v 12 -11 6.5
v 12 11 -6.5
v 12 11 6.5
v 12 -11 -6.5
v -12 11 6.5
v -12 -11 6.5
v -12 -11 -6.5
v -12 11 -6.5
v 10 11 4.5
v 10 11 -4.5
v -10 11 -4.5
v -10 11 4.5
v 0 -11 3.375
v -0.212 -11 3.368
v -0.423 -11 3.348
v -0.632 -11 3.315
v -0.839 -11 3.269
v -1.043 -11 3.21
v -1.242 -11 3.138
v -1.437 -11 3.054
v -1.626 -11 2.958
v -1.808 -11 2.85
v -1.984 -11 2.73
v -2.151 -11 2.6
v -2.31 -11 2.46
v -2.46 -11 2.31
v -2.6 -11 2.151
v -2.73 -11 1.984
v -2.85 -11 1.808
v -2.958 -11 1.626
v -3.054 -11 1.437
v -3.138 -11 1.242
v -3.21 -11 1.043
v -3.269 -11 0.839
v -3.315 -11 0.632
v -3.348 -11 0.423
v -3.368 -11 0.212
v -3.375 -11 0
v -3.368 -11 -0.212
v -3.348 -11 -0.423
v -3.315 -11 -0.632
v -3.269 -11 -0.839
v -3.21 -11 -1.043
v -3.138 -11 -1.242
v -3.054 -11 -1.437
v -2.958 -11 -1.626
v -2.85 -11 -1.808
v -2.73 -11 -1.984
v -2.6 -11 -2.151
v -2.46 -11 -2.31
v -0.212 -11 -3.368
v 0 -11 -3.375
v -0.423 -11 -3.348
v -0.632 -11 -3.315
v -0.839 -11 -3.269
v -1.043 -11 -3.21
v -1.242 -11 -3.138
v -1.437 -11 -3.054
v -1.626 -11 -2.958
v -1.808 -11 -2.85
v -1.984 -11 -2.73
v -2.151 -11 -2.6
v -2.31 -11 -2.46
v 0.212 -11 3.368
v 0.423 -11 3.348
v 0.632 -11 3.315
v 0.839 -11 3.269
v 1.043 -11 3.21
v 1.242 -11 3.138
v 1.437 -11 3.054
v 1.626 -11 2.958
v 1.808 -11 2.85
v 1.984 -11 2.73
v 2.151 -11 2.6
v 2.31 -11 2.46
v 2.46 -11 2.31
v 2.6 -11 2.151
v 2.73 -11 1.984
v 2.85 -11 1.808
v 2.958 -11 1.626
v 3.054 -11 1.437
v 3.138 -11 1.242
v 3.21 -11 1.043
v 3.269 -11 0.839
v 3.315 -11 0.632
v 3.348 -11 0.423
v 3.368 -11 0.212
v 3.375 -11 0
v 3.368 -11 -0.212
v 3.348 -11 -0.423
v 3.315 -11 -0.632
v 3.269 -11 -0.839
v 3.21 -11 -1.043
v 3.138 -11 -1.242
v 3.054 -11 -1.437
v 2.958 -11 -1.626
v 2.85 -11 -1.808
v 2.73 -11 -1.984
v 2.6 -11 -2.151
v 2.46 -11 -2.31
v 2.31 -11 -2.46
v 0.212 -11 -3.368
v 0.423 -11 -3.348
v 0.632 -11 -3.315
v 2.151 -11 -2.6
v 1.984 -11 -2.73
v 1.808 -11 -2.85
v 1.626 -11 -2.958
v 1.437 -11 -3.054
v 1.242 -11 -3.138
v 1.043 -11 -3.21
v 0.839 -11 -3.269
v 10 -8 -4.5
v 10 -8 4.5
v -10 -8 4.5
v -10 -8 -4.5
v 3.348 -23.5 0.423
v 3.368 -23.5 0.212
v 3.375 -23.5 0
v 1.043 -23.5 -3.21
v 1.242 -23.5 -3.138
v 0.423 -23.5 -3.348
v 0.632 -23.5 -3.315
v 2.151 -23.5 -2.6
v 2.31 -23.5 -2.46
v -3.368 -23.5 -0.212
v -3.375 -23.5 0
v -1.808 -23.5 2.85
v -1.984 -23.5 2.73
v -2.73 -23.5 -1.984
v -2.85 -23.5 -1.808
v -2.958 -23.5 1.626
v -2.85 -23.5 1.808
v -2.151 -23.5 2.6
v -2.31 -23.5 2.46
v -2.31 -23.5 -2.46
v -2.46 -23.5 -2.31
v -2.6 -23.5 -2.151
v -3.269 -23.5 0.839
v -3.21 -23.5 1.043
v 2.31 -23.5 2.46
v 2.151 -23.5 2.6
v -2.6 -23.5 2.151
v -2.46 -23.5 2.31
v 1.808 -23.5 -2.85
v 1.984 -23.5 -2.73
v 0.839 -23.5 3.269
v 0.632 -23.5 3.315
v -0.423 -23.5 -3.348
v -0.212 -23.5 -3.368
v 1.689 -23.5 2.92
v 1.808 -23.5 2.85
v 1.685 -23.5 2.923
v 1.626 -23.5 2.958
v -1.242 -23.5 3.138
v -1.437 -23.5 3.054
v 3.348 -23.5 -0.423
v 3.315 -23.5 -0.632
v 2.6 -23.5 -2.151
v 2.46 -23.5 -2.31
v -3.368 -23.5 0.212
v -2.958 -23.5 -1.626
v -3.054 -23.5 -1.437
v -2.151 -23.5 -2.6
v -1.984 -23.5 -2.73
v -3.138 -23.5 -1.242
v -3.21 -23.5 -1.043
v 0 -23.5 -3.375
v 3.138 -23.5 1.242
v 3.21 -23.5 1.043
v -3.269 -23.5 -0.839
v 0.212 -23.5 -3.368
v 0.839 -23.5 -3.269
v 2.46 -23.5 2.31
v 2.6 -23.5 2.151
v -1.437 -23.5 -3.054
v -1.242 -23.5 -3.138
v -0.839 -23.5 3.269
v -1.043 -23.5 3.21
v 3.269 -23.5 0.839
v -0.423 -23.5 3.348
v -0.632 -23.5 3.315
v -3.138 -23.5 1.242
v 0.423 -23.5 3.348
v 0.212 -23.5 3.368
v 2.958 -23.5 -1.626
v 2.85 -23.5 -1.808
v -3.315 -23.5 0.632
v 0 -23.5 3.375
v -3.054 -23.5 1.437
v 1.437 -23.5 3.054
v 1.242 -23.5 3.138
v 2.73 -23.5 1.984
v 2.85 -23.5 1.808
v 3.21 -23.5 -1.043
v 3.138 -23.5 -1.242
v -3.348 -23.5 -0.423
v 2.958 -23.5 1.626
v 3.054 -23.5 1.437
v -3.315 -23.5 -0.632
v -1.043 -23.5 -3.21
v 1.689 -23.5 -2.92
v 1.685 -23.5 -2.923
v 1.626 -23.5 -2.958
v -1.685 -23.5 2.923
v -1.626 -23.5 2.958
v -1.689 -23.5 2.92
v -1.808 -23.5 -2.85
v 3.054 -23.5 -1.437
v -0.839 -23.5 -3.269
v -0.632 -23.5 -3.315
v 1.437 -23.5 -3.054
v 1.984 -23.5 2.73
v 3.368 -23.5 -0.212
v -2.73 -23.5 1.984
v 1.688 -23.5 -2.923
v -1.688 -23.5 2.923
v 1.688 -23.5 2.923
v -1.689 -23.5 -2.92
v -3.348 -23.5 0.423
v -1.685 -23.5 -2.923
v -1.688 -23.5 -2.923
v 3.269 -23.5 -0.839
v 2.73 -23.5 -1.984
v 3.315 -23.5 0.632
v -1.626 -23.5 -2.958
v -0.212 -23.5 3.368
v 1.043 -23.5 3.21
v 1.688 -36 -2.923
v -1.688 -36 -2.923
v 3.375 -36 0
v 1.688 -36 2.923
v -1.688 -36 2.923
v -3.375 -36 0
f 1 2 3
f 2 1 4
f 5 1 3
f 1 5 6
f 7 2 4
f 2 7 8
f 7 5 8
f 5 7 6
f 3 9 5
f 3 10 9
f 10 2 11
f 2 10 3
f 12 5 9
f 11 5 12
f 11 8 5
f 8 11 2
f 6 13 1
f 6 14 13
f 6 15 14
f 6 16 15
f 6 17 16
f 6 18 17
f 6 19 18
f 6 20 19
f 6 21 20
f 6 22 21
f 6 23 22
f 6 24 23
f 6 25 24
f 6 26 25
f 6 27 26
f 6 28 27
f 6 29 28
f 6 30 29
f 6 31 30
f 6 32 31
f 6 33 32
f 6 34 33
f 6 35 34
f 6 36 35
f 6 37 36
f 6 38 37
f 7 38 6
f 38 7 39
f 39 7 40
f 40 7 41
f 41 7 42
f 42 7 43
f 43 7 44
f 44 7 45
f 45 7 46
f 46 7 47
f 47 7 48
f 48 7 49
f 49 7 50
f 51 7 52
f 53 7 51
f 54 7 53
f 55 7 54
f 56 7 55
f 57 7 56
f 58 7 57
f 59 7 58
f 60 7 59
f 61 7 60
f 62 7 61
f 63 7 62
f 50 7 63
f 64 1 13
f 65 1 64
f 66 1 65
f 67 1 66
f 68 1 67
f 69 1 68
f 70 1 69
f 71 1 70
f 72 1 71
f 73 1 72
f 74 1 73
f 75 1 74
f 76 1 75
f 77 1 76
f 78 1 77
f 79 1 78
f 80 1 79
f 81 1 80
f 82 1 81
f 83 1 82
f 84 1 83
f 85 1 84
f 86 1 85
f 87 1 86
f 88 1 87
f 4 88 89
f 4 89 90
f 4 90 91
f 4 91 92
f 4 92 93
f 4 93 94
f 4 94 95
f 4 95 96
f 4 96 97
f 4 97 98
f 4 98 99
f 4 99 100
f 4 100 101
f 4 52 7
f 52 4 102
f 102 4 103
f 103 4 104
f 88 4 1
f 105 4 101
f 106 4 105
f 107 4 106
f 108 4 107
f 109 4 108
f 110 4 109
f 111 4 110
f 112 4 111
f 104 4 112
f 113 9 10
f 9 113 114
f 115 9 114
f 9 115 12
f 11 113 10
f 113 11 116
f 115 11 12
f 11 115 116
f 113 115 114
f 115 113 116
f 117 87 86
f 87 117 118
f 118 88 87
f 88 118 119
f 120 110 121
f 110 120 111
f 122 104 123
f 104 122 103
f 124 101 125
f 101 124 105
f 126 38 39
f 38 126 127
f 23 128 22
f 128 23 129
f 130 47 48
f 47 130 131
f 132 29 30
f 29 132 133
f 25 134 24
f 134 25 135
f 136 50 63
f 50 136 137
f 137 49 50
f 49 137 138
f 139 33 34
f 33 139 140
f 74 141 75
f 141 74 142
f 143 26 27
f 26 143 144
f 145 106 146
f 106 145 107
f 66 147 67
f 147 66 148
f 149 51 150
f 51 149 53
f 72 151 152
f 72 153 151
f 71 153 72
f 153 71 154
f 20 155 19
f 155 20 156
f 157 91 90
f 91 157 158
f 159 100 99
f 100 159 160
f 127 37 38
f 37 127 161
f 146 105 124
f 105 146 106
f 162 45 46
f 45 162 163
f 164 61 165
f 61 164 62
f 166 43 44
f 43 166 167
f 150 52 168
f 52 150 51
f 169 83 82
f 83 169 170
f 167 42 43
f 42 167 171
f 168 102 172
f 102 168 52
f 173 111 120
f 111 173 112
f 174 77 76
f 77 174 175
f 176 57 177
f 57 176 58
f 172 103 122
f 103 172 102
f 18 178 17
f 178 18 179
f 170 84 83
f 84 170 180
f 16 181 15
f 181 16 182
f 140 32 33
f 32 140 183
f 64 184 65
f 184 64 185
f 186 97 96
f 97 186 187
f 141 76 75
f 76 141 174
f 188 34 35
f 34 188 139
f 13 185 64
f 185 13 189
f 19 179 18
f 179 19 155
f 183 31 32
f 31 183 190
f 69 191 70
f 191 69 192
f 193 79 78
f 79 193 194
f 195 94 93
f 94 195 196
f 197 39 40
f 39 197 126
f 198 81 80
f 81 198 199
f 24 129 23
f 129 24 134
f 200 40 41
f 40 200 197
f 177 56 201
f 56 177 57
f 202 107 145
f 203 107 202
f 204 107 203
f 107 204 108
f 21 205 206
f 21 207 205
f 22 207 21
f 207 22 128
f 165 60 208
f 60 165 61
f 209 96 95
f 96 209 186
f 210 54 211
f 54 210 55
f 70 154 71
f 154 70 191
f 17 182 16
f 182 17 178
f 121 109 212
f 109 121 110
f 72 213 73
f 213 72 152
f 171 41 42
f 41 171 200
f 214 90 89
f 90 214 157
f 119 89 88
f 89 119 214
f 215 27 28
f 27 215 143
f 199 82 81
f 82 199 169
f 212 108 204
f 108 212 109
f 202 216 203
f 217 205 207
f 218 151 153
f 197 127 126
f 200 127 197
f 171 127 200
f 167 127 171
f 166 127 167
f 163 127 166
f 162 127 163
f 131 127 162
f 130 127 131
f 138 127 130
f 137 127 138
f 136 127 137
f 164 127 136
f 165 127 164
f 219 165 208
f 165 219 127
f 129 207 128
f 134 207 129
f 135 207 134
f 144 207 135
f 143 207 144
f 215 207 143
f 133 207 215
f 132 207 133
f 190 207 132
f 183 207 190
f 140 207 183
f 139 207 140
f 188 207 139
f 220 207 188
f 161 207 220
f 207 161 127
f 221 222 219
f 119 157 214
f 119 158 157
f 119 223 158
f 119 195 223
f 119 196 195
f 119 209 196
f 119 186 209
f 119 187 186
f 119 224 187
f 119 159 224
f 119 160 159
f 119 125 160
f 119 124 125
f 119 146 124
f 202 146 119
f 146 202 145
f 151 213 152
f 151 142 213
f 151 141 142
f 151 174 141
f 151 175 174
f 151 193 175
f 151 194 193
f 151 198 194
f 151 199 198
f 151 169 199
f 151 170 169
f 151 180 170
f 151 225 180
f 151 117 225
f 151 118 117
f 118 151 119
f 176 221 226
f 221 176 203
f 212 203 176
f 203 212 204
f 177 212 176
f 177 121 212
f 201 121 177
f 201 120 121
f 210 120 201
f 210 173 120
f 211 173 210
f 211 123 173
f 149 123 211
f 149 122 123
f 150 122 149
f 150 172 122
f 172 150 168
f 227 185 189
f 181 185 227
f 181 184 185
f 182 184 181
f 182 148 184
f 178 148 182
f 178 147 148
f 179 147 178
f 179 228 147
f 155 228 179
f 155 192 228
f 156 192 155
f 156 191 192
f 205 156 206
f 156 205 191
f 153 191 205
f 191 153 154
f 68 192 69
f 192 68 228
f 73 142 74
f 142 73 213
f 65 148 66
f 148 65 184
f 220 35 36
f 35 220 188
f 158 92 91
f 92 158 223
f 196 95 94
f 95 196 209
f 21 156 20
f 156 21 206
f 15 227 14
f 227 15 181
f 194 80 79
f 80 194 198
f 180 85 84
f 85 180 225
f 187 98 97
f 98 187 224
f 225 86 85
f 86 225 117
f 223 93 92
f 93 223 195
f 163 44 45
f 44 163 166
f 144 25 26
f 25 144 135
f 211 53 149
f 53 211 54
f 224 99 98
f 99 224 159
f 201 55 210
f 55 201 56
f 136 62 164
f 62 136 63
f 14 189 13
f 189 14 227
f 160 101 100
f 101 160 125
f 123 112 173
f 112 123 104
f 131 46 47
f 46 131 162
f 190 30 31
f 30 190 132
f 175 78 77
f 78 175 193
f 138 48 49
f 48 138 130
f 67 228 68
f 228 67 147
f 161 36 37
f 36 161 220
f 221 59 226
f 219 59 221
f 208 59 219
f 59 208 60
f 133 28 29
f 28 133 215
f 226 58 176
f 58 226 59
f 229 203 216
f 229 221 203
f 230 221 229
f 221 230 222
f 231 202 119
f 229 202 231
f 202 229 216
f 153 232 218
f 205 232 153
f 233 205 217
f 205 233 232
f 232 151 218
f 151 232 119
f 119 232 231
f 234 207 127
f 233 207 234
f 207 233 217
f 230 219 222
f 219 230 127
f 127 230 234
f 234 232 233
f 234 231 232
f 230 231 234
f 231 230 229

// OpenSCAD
//Guitar Tuner Drill Atachment 
tunerWidth = 20;
tunerHeight = 9;
tunerDepth = 20;
pocketWall = 2;
rodDiameter = 6.75;
rodSmoothSectionLength = 12.5;
rodHexSectionLength = 12.5;

difference() {
    cube([tunerWidth+pocketWall*2, tunerDepth+pocketWall, tunerHeight+pocketWall*2], center=true);
    translate([0, pocketWall, 0]) cube([tunerWidth, tunerDepth, tunerHeight], center=true);
}
rotate([90, 0, 0]) translate([0, 0, (tunerDepth+pocketWall)/2]) {
    cylinder(h = rodSmoothSectionLength, d = rodDiameter, $fn=100);
    translate([0, 0, rodSmoothSectionLength]) cylinder(h = rodHexSectionLength, d = rodDiameter, $fn=6);
}
